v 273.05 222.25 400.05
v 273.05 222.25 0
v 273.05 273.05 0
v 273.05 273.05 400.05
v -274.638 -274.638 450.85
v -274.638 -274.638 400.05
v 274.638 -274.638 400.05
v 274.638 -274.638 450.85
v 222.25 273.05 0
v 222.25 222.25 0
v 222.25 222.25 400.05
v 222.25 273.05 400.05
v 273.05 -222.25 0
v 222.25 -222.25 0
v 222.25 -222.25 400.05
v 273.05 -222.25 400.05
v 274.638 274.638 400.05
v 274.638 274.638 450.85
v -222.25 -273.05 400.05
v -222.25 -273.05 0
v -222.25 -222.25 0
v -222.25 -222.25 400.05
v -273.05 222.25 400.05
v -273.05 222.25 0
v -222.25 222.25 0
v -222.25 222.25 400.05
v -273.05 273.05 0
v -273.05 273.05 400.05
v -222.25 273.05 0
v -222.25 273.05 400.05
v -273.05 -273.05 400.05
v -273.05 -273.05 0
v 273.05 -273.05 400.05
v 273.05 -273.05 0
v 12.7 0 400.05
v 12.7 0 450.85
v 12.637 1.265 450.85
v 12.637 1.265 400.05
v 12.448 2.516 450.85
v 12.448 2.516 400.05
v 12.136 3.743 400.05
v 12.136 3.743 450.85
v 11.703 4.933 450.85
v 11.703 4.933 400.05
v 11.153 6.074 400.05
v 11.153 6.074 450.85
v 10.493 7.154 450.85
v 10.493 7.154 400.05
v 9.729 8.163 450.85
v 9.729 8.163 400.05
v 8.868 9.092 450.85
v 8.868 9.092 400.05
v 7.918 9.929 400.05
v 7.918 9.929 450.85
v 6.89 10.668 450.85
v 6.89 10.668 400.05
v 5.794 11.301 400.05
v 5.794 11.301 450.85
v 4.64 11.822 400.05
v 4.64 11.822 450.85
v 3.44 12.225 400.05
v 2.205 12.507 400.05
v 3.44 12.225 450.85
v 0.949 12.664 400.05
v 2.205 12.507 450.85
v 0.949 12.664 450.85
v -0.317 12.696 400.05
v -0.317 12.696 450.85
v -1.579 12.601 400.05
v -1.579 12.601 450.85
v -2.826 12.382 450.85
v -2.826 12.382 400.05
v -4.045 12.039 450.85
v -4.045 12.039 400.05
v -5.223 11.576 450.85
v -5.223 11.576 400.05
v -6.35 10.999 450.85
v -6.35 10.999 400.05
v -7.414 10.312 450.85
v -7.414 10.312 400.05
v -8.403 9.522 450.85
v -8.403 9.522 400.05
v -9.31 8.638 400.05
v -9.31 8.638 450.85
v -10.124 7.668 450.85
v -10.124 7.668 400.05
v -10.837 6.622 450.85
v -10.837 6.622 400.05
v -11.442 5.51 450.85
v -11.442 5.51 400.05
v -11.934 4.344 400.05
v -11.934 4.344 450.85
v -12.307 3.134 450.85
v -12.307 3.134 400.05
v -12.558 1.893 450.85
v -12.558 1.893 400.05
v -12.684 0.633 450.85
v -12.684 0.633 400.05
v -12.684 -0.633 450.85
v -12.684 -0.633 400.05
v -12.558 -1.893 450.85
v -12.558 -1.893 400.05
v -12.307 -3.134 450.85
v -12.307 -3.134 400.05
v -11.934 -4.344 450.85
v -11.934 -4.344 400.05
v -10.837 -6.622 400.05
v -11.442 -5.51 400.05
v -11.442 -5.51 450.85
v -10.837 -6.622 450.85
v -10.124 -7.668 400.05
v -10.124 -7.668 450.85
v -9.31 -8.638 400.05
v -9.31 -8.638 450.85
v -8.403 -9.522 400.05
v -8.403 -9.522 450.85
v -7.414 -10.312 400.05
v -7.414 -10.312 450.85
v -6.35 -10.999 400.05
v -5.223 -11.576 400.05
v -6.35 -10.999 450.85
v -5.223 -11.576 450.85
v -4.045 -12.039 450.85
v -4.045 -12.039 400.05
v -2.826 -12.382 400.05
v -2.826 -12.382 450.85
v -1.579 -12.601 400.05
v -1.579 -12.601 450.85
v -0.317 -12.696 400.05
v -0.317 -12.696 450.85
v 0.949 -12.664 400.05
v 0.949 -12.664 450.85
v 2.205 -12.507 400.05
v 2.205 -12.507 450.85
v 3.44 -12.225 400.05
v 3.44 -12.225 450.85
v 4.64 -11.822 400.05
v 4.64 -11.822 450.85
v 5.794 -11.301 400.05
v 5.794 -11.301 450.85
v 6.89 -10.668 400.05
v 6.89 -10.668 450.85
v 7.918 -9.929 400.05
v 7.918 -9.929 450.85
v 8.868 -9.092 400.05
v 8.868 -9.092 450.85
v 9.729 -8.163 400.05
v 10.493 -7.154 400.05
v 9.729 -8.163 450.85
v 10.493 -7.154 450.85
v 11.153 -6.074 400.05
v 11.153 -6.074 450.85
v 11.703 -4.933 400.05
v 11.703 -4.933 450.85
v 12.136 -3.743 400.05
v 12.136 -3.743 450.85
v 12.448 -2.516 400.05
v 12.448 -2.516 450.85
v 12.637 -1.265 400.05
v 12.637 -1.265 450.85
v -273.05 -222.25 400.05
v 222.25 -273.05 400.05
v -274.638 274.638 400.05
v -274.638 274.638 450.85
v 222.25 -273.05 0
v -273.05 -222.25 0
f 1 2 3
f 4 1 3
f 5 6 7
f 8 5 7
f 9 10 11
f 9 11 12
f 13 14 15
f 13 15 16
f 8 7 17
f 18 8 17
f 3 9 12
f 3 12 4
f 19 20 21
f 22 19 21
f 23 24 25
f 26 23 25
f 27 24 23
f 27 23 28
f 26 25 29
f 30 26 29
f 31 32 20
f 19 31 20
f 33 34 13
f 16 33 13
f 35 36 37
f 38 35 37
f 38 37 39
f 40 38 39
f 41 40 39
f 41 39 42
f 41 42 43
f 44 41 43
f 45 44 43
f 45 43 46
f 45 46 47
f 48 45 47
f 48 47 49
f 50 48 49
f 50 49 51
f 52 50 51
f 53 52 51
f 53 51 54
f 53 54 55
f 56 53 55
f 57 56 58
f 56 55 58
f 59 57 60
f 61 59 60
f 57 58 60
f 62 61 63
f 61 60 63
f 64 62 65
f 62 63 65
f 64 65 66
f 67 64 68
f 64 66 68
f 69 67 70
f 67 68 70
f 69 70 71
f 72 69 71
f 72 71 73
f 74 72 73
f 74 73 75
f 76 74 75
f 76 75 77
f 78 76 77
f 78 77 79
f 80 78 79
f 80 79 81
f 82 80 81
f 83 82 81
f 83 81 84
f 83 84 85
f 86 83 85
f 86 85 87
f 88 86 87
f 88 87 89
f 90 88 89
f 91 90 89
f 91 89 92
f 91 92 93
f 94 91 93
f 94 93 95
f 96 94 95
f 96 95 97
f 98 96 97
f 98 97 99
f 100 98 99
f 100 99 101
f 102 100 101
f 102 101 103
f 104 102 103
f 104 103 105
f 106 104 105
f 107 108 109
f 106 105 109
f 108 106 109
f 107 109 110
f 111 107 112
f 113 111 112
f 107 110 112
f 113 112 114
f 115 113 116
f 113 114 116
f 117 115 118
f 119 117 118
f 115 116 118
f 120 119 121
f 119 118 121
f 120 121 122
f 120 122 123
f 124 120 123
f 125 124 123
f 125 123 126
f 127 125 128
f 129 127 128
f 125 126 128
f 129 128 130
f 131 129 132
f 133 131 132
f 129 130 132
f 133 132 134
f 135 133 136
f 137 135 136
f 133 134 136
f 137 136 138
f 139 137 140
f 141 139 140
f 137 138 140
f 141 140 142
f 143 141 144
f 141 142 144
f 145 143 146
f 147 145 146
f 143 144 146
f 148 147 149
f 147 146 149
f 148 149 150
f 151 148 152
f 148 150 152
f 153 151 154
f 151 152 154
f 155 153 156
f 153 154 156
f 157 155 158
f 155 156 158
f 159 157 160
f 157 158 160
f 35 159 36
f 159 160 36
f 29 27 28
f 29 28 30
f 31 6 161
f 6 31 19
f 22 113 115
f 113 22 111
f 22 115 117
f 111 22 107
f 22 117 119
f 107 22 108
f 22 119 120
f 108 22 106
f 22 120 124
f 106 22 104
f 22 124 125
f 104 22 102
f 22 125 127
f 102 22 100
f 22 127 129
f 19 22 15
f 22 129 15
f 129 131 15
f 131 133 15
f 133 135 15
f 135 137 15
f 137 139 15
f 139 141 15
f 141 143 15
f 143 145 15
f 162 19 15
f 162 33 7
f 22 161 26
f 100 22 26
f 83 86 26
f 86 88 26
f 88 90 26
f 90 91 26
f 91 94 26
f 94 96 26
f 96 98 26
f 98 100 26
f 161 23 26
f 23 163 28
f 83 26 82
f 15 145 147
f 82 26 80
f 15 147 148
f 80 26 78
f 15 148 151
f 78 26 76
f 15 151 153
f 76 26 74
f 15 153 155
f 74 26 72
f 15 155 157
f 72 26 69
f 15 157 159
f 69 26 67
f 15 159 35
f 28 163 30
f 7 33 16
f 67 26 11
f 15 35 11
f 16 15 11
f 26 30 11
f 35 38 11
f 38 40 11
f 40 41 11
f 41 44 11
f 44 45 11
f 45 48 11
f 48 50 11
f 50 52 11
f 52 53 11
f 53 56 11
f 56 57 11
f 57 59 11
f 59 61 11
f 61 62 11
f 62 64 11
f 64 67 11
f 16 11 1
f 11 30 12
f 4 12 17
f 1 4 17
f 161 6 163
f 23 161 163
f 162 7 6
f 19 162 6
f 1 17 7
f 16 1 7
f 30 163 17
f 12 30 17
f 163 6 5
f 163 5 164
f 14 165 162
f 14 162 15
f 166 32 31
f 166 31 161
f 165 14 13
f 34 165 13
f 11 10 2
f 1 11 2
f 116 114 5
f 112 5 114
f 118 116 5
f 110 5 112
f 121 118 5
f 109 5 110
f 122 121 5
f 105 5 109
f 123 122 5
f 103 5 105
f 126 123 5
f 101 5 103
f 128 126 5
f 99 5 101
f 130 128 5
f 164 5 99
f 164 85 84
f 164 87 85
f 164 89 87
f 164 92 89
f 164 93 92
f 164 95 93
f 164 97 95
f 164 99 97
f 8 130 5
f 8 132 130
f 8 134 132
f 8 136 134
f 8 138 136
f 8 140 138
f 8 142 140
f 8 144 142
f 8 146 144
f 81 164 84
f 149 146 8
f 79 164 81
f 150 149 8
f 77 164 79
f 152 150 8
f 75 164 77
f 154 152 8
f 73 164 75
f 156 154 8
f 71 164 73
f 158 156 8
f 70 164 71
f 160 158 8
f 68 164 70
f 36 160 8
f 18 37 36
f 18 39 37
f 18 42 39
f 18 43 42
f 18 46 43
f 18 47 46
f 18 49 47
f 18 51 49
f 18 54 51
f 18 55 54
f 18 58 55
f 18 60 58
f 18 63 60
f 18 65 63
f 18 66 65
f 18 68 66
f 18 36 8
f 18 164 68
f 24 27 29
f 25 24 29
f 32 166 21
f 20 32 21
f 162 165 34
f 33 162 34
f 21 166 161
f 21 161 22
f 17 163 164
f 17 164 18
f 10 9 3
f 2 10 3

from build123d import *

# Parameters (mm, degrees)
F0_W     = 50.8
F0_H     = 50.8
F1_DEPTH = 400.05
F2_W     = 549.275
F2_H     = 549.275
F2_W_2   = 50.8
F2_H_2   = 50.8
F3_DEPTH = 50.8
F4_R     = 12.7
F5_DEPTH = 450.851


with BuildPart() as f1:
    # F0 (on Top) → F1 (new body)
    with BuildSketch(Plane.XY):
        with Locations((-247.65, 247.65)):
            Rectangle(F0_W, F0_H)
    extrude(amount=F1_DEPTH)



with BuildPart() as f1b:
    # F0 (on Top) → F1, piece 2 (new body)
    with BuildSketch(Plane.XY):
        with Locations((247.65, 247.65)):
            Rectangle(F0_W, F0_H)
    extrude(amount=F1_DEPTH)


with BuildPart() as f1c:
    # F0 (on Top) → F1, piece 3 (new body)
    with BuildSketch(Plane.XY):
        with Locations((-247.65, -247.65)):
            Rectangle(F0_W, F0_H)
    extrude(amount=F1_DEPTH)


with BuildPart() as f1d:
    # F0 (on Top) → F1, piece 4 (new body)
    with BuildSketch(Plane.XY):
        with Locations((247.65, -247.65)):
            Rectangle(F0_W, F0_H)
    extrude(amount=F1_DEPTH)


with BuildPart() as f1_1:
    add(f1.part)

    add(f1b.part)  # F3 merges F1b

    add(f1c.part)  # F3 merges F1c

    add(f1d.part)  # F3 merges F1d
    # F2 (on face) → F3 (join)
    with BuildSketch(Plane.XY.offset(400.05)):
        Rectangle(F2_W, F2_H)
        with Locations((-247.65, -247.65)):
            Rectangle(F2_W_2, F2_H_2, mode=Mode.SUBTRACT)
        with Locations((-247.65, -247.65)):
            Rectangle(F2_W_2, F2_H_2)
    extrude(amount=F3_DEPTH)

    # F4 (on face) → F5 (cut, through all)
    with BuildSketch(Plane.XY.offset(450.85)):
        Circle(F4_R)
    extrude(amount=-F5_DEPTH, mode=Mode.SUBTRACT)


solid = f1_1.part
